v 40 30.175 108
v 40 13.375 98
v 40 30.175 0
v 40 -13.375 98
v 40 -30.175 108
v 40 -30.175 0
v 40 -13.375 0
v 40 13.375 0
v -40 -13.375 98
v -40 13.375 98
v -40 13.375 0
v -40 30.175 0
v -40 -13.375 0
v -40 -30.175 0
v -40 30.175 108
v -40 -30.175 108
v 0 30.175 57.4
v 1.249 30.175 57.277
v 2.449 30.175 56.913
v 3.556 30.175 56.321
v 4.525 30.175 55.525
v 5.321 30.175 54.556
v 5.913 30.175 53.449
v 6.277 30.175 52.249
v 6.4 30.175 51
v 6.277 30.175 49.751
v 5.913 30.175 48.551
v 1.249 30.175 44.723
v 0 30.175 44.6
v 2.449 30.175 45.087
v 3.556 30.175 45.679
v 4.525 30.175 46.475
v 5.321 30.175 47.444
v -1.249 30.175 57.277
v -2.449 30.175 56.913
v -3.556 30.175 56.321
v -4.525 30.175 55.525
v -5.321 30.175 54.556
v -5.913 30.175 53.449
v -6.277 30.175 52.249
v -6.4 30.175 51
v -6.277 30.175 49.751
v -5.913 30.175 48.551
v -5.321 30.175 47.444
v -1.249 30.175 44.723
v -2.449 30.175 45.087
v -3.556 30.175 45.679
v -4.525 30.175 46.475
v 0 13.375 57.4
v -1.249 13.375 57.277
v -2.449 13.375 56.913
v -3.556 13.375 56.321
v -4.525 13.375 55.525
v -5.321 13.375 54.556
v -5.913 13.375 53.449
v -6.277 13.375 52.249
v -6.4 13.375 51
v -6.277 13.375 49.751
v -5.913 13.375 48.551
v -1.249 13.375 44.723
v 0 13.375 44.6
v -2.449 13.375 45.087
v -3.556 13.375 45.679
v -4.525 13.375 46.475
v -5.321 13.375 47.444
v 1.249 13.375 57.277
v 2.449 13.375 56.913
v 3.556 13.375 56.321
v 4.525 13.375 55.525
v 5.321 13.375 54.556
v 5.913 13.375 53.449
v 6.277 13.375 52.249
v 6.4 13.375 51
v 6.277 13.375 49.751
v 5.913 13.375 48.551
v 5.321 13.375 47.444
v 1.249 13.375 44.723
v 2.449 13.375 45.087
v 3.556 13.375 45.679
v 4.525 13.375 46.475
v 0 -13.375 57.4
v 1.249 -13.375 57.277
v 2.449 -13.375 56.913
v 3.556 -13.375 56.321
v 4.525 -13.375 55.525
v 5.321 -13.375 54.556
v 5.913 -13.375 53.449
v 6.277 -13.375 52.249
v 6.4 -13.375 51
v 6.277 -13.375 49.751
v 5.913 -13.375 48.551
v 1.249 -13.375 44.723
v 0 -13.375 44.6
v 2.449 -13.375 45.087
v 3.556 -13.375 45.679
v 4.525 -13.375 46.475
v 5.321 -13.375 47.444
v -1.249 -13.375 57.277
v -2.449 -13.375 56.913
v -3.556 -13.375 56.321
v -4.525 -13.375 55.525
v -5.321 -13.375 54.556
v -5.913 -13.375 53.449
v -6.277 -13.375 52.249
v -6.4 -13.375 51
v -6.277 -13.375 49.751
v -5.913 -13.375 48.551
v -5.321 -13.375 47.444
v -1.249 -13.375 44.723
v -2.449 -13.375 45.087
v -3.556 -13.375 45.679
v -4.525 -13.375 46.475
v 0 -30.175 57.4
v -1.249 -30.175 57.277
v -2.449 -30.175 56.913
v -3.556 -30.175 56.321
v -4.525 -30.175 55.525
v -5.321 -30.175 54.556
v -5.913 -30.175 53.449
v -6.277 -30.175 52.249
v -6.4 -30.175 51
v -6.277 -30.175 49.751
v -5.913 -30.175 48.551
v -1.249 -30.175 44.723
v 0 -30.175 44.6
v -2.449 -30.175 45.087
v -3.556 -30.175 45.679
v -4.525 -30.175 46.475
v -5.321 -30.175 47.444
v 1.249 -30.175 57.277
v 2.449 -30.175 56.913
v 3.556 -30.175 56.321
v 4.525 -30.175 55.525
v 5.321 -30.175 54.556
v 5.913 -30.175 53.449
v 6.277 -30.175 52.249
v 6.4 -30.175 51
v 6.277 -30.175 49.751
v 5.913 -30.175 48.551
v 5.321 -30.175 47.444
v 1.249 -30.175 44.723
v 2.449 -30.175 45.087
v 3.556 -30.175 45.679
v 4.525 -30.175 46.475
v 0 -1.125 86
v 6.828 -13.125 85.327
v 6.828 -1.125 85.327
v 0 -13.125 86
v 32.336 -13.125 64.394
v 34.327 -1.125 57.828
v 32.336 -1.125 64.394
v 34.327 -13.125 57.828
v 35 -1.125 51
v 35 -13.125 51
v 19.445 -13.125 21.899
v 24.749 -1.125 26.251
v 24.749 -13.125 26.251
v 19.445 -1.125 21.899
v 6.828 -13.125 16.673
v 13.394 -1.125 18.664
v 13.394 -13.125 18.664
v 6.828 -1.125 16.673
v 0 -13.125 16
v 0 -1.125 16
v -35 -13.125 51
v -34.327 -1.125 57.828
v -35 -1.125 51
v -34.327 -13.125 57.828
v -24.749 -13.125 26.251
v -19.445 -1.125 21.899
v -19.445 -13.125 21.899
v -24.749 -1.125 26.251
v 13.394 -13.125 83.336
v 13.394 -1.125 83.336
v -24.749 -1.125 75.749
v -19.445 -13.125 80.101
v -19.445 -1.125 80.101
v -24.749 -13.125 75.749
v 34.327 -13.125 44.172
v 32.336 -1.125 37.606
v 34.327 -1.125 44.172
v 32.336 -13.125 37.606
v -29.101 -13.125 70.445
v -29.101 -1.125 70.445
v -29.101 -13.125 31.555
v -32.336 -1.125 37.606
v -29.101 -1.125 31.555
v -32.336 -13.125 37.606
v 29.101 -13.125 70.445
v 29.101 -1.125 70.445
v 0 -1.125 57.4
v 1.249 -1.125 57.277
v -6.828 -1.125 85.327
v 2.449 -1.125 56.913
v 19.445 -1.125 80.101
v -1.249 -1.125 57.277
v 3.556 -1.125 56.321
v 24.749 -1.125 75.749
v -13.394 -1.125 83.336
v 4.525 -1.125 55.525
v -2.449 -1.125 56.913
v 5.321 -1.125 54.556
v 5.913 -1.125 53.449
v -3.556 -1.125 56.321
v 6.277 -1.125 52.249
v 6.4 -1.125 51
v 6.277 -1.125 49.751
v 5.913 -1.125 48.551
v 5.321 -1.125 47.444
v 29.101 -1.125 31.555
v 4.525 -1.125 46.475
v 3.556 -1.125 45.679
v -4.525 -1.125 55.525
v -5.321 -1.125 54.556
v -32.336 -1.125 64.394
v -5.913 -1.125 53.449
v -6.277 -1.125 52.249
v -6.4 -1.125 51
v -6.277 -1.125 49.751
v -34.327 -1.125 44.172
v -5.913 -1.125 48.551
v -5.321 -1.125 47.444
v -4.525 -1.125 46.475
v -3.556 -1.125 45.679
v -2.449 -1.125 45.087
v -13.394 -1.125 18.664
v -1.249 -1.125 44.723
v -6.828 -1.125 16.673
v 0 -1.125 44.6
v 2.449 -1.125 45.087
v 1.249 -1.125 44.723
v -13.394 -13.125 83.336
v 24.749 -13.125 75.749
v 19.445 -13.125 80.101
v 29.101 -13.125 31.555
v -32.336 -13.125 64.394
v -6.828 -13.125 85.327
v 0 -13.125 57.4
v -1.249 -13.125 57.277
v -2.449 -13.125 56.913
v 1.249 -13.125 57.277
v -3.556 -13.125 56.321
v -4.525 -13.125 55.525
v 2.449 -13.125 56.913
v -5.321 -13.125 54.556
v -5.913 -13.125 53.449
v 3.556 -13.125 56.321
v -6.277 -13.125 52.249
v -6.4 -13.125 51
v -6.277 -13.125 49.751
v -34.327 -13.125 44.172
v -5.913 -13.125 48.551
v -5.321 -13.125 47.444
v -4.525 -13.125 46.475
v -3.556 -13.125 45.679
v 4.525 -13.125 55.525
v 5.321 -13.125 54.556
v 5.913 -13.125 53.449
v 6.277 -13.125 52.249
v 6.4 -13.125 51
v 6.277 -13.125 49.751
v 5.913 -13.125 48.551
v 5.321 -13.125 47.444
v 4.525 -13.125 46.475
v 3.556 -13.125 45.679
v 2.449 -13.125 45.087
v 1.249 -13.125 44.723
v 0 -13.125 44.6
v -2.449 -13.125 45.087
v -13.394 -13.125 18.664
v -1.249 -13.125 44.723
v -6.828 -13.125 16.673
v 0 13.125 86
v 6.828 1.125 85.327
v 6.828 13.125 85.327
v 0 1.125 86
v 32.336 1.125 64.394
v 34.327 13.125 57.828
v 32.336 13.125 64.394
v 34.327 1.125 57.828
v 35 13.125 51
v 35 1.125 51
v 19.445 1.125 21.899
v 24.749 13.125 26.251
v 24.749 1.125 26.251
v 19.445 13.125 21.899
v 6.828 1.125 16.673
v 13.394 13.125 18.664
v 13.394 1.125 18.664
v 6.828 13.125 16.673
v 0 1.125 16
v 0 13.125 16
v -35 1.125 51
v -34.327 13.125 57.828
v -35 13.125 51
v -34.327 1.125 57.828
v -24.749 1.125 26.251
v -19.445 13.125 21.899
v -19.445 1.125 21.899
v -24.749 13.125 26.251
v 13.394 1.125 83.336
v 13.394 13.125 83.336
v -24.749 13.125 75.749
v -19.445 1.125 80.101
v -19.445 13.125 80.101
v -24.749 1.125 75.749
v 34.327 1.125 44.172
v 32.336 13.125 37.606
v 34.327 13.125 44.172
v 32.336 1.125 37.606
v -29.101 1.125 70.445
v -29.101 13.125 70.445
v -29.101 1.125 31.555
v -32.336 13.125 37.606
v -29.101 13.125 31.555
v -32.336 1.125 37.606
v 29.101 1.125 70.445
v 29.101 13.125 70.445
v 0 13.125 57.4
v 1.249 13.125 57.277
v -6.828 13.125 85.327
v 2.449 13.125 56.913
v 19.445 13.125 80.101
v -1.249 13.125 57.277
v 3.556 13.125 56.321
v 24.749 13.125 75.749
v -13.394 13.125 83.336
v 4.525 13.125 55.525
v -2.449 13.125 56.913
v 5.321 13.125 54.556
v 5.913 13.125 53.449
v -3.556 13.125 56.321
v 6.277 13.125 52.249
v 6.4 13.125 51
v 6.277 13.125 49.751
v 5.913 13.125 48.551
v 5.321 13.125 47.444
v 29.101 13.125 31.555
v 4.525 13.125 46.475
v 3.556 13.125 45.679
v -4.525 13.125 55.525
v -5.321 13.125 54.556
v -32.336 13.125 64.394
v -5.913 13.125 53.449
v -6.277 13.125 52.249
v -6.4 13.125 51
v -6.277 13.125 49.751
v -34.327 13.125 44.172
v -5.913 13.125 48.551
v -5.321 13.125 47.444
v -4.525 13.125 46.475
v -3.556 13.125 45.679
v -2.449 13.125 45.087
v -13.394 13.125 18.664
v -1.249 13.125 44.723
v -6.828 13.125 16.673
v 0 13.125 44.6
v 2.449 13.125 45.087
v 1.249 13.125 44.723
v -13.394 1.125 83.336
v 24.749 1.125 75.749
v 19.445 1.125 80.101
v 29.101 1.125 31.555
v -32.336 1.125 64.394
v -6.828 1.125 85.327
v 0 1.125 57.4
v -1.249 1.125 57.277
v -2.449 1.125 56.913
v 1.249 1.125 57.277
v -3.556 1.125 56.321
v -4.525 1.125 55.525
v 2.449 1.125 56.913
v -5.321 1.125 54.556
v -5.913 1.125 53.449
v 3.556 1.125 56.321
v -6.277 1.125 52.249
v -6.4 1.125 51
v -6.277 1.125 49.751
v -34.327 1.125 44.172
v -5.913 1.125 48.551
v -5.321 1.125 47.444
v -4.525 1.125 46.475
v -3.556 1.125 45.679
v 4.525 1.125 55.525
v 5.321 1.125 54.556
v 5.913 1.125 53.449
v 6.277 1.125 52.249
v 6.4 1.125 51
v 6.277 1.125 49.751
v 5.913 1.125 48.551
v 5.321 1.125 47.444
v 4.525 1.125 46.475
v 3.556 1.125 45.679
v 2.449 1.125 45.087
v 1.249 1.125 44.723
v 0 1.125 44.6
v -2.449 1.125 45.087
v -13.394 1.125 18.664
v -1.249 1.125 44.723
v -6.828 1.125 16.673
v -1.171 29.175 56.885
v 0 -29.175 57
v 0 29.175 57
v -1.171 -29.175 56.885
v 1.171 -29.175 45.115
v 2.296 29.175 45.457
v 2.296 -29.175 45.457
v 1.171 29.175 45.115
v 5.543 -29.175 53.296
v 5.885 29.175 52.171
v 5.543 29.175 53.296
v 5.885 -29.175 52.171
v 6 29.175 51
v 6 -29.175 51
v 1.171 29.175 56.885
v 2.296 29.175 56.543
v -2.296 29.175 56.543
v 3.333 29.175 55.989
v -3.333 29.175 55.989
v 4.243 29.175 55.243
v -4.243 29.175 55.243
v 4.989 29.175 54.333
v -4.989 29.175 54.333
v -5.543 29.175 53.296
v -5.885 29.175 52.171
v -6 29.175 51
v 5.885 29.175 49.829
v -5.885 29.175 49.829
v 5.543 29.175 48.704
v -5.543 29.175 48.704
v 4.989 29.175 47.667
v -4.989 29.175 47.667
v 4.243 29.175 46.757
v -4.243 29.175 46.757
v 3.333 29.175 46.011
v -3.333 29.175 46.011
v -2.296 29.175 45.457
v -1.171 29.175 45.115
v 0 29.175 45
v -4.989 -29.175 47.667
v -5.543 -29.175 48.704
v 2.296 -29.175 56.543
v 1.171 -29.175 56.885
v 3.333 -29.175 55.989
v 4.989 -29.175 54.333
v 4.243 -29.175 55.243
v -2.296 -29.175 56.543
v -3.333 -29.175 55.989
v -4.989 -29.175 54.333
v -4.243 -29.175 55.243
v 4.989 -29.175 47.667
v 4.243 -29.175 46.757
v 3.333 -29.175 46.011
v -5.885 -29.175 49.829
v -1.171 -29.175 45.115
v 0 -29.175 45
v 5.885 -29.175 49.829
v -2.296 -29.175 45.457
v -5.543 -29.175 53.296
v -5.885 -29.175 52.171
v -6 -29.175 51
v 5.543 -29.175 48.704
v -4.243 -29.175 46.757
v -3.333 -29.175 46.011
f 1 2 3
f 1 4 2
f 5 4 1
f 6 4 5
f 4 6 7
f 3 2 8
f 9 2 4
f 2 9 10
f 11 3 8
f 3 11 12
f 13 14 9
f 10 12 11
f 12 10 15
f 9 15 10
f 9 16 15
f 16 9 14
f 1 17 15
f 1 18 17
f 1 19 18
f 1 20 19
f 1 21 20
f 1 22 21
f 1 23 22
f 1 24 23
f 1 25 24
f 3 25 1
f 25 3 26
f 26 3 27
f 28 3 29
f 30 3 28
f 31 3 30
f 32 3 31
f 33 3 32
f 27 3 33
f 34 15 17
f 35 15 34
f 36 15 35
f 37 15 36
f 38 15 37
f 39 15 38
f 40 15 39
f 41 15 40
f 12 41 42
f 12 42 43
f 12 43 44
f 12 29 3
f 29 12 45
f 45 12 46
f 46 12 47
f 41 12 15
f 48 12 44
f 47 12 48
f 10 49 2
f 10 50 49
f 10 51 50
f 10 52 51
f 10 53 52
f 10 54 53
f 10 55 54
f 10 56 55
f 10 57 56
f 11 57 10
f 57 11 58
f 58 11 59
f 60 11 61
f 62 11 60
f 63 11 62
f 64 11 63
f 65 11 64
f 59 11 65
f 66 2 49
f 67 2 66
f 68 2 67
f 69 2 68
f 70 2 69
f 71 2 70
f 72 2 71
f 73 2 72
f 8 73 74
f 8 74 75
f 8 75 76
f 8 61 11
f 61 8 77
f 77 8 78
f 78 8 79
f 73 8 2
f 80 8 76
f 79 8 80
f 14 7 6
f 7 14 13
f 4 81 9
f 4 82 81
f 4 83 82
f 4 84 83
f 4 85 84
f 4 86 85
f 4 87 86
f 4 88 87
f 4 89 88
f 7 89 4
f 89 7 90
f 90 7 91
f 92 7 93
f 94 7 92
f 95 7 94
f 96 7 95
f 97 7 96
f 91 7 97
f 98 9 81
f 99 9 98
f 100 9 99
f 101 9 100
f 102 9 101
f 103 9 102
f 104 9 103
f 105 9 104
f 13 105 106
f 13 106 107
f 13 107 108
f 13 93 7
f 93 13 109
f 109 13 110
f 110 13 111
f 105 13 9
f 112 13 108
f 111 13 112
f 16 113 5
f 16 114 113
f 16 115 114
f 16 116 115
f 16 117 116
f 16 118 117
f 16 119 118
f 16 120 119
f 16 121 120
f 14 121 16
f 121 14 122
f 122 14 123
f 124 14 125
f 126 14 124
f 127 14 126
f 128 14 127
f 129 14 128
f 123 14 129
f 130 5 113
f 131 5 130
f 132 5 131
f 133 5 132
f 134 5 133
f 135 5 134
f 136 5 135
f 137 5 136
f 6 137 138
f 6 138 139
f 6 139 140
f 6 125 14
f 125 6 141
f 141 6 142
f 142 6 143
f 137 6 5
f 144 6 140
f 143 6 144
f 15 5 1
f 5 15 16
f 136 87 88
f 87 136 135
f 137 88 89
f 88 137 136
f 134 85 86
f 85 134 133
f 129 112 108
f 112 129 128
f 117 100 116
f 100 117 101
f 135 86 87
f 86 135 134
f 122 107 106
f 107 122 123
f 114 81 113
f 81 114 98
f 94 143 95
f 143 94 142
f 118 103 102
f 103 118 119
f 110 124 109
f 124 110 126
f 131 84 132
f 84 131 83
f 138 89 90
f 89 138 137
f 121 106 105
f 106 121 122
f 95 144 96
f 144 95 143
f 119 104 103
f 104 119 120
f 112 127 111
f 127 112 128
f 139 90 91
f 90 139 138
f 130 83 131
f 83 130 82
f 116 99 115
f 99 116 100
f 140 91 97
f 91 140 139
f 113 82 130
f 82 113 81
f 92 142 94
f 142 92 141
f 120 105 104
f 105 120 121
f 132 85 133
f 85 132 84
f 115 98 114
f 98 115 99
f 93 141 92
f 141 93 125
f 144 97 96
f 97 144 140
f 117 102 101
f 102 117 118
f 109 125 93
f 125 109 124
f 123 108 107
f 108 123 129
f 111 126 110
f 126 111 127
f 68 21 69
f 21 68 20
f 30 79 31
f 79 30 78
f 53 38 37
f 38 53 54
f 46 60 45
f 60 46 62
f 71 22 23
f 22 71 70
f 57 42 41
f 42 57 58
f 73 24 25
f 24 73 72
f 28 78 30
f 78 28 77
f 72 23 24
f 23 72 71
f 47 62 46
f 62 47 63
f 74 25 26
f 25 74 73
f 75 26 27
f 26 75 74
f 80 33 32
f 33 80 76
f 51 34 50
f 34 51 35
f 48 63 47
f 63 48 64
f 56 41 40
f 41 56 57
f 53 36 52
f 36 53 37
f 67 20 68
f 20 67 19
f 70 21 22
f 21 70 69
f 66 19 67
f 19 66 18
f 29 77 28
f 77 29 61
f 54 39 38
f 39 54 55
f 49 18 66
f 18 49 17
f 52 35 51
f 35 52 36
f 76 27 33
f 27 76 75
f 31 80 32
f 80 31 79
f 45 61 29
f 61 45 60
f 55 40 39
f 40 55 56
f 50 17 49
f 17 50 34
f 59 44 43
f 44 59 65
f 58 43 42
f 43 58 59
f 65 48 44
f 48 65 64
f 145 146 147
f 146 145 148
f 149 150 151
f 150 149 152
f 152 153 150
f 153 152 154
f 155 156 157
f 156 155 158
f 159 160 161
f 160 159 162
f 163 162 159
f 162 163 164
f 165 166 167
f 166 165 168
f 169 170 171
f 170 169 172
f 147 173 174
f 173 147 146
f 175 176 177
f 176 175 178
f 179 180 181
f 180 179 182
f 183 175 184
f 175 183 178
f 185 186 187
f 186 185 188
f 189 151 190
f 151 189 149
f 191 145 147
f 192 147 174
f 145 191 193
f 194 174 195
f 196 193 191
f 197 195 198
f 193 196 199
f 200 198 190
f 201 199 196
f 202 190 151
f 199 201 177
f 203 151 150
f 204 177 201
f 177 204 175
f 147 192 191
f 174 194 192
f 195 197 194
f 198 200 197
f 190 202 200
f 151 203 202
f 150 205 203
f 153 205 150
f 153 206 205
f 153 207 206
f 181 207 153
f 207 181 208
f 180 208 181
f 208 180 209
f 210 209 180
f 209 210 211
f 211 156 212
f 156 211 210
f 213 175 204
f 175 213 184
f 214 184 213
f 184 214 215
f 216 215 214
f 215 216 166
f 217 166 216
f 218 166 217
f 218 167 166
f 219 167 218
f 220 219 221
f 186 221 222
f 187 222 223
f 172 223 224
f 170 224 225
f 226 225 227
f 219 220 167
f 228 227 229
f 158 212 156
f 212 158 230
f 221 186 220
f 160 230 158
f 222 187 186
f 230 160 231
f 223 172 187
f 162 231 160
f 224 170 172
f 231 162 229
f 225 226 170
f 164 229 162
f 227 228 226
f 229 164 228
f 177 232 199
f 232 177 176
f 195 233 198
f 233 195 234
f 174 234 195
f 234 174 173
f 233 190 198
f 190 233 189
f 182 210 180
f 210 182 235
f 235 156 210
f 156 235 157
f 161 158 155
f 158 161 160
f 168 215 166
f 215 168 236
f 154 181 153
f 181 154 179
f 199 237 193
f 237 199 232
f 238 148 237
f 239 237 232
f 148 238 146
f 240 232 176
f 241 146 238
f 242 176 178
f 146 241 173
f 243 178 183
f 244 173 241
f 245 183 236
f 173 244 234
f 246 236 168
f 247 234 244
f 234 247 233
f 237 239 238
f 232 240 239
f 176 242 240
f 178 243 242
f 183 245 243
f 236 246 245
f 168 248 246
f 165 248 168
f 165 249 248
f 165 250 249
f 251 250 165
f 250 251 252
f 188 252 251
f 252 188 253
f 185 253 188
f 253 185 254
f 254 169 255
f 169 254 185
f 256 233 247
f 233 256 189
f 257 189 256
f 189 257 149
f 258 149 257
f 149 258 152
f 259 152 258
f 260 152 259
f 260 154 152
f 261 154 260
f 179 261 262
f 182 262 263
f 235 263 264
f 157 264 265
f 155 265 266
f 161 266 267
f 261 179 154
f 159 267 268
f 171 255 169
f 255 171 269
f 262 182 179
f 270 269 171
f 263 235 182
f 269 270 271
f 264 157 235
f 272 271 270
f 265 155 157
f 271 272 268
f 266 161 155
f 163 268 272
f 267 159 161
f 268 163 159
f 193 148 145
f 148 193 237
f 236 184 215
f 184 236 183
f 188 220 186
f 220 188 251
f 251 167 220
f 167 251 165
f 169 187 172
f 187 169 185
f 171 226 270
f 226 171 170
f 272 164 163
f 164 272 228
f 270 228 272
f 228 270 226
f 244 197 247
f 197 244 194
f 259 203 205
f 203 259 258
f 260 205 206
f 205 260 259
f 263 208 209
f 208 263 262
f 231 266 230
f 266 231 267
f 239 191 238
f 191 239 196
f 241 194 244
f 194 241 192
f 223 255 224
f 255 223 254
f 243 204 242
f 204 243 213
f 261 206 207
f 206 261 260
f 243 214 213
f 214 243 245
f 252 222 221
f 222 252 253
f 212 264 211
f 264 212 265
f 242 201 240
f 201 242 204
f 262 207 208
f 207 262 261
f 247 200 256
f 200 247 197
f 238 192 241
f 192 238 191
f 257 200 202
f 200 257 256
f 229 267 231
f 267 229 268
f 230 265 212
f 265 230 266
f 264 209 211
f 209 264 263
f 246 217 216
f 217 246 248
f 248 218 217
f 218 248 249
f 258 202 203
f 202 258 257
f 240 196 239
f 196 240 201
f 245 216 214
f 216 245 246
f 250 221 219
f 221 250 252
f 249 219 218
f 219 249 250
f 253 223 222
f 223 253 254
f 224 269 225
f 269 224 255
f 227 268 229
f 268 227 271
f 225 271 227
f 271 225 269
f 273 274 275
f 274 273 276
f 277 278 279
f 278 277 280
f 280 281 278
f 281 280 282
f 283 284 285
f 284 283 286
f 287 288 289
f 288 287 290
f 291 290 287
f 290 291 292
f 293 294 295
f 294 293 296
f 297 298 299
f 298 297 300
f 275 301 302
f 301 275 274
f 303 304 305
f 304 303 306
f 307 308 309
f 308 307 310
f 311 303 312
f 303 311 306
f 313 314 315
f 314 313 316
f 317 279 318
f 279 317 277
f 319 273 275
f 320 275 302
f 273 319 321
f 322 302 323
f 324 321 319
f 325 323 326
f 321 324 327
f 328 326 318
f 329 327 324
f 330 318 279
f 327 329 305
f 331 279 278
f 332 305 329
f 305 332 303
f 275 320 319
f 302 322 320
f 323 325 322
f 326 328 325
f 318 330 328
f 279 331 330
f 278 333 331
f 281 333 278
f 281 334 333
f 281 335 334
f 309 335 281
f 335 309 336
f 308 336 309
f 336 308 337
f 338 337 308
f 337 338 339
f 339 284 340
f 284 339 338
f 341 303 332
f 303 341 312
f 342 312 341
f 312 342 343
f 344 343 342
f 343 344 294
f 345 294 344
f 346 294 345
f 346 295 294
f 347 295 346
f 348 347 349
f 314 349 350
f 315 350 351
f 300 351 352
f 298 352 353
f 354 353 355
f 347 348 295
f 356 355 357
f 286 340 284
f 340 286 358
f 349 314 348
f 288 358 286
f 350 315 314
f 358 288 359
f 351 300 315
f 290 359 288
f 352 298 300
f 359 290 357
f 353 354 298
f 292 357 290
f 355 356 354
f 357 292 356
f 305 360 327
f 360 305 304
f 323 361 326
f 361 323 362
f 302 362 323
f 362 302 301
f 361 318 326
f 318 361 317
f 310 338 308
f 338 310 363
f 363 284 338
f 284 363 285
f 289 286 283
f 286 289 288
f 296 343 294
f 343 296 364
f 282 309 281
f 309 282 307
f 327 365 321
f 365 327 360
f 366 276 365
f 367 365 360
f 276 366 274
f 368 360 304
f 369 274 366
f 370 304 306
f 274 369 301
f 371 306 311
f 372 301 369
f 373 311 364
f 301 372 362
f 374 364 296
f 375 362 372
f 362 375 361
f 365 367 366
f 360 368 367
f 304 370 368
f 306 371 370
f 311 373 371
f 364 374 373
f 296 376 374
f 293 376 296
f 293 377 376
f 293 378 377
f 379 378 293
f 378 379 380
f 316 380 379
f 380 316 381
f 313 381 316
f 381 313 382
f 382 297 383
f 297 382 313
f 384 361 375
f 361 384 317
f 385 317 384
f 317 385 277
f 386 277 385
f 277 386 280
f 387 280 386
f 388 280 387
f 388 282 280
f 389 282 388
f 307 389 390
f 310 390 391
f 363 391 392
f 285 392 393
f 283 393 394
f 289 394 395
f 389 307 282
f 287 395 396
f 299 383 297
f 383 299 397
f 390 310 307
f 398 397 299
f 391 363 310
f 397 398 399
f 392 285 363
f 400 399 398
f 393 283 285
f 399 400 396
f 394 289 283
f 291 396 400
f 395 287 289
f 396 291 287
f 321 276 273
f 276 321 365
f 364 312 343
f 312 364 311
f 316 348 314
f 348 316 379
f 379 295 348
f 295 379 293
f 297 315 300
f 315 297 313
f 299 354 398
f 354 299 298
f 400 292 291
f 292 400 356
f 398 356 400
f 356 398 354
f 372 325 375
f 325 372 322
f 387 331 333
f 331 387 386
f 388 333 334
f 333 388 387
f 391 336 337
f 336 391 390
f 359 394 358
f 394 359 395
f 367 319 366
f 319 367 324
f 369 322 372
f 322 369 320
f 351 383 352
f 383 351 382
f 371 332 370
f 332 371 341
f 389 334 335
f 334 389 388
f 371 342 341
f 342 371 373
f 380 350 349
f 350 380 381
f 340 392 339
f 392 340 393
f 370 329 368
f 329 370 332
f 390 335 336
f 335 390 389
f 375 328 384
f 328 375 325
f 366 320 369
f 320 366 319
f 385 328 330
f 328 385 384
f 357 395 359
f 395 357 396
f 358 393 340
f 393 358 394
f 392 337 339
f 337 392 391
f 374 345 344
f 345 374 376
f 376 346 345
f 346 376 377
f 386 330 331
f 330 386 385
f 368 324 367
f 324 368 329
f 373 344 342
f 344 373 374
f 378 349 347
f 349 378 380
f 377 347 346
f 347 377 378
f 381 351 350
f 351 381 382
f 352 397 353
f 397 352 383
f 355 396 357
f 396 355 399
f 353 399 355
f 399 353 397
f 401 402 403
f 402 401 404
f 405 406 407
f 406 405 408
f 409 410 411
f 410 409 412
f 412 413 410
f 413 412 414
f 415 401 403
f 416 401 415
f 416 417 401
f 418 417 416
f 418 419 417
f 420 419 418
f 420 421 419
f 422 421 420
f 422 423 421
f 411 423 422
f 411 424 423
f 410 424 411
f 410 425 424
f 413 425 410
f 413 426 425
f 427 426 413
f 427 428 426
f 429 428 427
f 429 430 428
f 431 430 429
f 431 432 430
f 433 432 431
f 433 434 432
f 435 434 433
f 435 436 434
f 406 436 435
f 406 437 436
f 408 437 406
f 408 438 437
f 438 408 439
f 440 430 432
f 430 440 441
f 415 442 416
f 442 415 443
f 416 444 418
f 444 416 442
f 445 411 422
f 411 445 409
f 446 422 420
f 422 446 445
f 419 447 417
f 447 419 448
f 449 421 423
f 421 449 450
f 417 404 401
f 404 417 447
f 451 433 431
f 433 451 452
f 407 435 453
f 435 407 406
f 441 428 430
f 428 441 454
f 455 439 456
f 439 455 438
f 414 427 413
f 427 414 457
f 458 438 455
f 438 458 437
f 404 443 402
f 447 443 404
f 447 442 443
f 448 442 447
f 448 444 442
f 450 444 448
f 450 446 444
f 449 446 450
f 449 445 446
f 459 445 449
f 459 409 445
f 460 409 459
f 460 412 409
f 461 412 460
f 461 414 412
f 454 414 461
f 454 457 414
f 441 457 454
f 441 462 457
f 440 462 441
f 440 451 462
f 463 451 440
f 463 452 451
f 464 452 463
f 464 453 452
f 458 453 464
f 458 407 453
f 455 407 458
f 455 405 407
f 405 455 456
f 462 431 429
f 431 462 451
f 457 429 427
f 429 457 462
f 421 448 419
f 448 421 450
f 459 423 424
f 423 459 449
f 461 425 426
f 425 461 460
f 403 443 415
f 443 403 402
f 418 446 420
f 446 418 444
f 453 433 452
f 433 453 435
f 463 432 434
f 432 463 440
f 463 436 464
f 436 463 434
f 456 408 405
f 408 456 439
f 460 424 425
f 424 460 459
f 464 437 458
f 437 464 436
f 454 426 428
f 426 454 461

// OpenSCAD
$fn = 32;

// ------------------------------------------------------------------------
// Trolley wheel set: wheels d70, fork 98 mm tall
// Every part is its own module, assembly() places every instance.
// ------------------------------------------------------------------------

// --- part 1 ---
module trolley_fork() {
  difference() {
    union() {
      translate([-40, 13.375, 0]) cube([80, 16.8, 98]);
      translate([-40, -30.175, 0]) cube([80, 16.8, 98]);
      translate([-40, -30.175, 98]) cube([80, 60.35, 10]);
    }
    translate([0, -21.775, 51]) rotate([90, 0, 0]) cylinder(h = 18.8, d = 12.8, center = true);
    translate([0, 21.775, 51]) rotate([90, 0, 0]) cylinder(h = 18.8, d = 12.8, center = true);
  }
}

// --- part 2 ---
module trolley_wheel() {
  difference() {
      translate([0, 0, 0]) cylinder(h = 12, d = 70);
      translate([0, 0, -1]) cylinder(h = 14, d = 12.8);
    }
}

// --- part 3 ---
module trolley_axle() {
  translate([0, 0, -29.175]) cylinder(h = 58.35, d = 12);
}

// --- assembly ---
module assembly() {
  color([0.80, 0.24, 0.20]) translate([0, 0, 0]) rotate([0, 0, 0]) trolley_fork();
  color([0.20, 0.45, 0.75]) translate([0, -1.125, 51]) rotate([90, 0, 0]) trolley_wheel();
  color([0.25, 0.62, 0.32]) translate([0, 13.125, 51]) rotate([90, 0, 0]) trolley_wheel();
  color([0.92, 0.70, 0.18]) translate([0, 0, 51]) rotate([90, 0, 0]) trolley_axle();
}

assembly();
